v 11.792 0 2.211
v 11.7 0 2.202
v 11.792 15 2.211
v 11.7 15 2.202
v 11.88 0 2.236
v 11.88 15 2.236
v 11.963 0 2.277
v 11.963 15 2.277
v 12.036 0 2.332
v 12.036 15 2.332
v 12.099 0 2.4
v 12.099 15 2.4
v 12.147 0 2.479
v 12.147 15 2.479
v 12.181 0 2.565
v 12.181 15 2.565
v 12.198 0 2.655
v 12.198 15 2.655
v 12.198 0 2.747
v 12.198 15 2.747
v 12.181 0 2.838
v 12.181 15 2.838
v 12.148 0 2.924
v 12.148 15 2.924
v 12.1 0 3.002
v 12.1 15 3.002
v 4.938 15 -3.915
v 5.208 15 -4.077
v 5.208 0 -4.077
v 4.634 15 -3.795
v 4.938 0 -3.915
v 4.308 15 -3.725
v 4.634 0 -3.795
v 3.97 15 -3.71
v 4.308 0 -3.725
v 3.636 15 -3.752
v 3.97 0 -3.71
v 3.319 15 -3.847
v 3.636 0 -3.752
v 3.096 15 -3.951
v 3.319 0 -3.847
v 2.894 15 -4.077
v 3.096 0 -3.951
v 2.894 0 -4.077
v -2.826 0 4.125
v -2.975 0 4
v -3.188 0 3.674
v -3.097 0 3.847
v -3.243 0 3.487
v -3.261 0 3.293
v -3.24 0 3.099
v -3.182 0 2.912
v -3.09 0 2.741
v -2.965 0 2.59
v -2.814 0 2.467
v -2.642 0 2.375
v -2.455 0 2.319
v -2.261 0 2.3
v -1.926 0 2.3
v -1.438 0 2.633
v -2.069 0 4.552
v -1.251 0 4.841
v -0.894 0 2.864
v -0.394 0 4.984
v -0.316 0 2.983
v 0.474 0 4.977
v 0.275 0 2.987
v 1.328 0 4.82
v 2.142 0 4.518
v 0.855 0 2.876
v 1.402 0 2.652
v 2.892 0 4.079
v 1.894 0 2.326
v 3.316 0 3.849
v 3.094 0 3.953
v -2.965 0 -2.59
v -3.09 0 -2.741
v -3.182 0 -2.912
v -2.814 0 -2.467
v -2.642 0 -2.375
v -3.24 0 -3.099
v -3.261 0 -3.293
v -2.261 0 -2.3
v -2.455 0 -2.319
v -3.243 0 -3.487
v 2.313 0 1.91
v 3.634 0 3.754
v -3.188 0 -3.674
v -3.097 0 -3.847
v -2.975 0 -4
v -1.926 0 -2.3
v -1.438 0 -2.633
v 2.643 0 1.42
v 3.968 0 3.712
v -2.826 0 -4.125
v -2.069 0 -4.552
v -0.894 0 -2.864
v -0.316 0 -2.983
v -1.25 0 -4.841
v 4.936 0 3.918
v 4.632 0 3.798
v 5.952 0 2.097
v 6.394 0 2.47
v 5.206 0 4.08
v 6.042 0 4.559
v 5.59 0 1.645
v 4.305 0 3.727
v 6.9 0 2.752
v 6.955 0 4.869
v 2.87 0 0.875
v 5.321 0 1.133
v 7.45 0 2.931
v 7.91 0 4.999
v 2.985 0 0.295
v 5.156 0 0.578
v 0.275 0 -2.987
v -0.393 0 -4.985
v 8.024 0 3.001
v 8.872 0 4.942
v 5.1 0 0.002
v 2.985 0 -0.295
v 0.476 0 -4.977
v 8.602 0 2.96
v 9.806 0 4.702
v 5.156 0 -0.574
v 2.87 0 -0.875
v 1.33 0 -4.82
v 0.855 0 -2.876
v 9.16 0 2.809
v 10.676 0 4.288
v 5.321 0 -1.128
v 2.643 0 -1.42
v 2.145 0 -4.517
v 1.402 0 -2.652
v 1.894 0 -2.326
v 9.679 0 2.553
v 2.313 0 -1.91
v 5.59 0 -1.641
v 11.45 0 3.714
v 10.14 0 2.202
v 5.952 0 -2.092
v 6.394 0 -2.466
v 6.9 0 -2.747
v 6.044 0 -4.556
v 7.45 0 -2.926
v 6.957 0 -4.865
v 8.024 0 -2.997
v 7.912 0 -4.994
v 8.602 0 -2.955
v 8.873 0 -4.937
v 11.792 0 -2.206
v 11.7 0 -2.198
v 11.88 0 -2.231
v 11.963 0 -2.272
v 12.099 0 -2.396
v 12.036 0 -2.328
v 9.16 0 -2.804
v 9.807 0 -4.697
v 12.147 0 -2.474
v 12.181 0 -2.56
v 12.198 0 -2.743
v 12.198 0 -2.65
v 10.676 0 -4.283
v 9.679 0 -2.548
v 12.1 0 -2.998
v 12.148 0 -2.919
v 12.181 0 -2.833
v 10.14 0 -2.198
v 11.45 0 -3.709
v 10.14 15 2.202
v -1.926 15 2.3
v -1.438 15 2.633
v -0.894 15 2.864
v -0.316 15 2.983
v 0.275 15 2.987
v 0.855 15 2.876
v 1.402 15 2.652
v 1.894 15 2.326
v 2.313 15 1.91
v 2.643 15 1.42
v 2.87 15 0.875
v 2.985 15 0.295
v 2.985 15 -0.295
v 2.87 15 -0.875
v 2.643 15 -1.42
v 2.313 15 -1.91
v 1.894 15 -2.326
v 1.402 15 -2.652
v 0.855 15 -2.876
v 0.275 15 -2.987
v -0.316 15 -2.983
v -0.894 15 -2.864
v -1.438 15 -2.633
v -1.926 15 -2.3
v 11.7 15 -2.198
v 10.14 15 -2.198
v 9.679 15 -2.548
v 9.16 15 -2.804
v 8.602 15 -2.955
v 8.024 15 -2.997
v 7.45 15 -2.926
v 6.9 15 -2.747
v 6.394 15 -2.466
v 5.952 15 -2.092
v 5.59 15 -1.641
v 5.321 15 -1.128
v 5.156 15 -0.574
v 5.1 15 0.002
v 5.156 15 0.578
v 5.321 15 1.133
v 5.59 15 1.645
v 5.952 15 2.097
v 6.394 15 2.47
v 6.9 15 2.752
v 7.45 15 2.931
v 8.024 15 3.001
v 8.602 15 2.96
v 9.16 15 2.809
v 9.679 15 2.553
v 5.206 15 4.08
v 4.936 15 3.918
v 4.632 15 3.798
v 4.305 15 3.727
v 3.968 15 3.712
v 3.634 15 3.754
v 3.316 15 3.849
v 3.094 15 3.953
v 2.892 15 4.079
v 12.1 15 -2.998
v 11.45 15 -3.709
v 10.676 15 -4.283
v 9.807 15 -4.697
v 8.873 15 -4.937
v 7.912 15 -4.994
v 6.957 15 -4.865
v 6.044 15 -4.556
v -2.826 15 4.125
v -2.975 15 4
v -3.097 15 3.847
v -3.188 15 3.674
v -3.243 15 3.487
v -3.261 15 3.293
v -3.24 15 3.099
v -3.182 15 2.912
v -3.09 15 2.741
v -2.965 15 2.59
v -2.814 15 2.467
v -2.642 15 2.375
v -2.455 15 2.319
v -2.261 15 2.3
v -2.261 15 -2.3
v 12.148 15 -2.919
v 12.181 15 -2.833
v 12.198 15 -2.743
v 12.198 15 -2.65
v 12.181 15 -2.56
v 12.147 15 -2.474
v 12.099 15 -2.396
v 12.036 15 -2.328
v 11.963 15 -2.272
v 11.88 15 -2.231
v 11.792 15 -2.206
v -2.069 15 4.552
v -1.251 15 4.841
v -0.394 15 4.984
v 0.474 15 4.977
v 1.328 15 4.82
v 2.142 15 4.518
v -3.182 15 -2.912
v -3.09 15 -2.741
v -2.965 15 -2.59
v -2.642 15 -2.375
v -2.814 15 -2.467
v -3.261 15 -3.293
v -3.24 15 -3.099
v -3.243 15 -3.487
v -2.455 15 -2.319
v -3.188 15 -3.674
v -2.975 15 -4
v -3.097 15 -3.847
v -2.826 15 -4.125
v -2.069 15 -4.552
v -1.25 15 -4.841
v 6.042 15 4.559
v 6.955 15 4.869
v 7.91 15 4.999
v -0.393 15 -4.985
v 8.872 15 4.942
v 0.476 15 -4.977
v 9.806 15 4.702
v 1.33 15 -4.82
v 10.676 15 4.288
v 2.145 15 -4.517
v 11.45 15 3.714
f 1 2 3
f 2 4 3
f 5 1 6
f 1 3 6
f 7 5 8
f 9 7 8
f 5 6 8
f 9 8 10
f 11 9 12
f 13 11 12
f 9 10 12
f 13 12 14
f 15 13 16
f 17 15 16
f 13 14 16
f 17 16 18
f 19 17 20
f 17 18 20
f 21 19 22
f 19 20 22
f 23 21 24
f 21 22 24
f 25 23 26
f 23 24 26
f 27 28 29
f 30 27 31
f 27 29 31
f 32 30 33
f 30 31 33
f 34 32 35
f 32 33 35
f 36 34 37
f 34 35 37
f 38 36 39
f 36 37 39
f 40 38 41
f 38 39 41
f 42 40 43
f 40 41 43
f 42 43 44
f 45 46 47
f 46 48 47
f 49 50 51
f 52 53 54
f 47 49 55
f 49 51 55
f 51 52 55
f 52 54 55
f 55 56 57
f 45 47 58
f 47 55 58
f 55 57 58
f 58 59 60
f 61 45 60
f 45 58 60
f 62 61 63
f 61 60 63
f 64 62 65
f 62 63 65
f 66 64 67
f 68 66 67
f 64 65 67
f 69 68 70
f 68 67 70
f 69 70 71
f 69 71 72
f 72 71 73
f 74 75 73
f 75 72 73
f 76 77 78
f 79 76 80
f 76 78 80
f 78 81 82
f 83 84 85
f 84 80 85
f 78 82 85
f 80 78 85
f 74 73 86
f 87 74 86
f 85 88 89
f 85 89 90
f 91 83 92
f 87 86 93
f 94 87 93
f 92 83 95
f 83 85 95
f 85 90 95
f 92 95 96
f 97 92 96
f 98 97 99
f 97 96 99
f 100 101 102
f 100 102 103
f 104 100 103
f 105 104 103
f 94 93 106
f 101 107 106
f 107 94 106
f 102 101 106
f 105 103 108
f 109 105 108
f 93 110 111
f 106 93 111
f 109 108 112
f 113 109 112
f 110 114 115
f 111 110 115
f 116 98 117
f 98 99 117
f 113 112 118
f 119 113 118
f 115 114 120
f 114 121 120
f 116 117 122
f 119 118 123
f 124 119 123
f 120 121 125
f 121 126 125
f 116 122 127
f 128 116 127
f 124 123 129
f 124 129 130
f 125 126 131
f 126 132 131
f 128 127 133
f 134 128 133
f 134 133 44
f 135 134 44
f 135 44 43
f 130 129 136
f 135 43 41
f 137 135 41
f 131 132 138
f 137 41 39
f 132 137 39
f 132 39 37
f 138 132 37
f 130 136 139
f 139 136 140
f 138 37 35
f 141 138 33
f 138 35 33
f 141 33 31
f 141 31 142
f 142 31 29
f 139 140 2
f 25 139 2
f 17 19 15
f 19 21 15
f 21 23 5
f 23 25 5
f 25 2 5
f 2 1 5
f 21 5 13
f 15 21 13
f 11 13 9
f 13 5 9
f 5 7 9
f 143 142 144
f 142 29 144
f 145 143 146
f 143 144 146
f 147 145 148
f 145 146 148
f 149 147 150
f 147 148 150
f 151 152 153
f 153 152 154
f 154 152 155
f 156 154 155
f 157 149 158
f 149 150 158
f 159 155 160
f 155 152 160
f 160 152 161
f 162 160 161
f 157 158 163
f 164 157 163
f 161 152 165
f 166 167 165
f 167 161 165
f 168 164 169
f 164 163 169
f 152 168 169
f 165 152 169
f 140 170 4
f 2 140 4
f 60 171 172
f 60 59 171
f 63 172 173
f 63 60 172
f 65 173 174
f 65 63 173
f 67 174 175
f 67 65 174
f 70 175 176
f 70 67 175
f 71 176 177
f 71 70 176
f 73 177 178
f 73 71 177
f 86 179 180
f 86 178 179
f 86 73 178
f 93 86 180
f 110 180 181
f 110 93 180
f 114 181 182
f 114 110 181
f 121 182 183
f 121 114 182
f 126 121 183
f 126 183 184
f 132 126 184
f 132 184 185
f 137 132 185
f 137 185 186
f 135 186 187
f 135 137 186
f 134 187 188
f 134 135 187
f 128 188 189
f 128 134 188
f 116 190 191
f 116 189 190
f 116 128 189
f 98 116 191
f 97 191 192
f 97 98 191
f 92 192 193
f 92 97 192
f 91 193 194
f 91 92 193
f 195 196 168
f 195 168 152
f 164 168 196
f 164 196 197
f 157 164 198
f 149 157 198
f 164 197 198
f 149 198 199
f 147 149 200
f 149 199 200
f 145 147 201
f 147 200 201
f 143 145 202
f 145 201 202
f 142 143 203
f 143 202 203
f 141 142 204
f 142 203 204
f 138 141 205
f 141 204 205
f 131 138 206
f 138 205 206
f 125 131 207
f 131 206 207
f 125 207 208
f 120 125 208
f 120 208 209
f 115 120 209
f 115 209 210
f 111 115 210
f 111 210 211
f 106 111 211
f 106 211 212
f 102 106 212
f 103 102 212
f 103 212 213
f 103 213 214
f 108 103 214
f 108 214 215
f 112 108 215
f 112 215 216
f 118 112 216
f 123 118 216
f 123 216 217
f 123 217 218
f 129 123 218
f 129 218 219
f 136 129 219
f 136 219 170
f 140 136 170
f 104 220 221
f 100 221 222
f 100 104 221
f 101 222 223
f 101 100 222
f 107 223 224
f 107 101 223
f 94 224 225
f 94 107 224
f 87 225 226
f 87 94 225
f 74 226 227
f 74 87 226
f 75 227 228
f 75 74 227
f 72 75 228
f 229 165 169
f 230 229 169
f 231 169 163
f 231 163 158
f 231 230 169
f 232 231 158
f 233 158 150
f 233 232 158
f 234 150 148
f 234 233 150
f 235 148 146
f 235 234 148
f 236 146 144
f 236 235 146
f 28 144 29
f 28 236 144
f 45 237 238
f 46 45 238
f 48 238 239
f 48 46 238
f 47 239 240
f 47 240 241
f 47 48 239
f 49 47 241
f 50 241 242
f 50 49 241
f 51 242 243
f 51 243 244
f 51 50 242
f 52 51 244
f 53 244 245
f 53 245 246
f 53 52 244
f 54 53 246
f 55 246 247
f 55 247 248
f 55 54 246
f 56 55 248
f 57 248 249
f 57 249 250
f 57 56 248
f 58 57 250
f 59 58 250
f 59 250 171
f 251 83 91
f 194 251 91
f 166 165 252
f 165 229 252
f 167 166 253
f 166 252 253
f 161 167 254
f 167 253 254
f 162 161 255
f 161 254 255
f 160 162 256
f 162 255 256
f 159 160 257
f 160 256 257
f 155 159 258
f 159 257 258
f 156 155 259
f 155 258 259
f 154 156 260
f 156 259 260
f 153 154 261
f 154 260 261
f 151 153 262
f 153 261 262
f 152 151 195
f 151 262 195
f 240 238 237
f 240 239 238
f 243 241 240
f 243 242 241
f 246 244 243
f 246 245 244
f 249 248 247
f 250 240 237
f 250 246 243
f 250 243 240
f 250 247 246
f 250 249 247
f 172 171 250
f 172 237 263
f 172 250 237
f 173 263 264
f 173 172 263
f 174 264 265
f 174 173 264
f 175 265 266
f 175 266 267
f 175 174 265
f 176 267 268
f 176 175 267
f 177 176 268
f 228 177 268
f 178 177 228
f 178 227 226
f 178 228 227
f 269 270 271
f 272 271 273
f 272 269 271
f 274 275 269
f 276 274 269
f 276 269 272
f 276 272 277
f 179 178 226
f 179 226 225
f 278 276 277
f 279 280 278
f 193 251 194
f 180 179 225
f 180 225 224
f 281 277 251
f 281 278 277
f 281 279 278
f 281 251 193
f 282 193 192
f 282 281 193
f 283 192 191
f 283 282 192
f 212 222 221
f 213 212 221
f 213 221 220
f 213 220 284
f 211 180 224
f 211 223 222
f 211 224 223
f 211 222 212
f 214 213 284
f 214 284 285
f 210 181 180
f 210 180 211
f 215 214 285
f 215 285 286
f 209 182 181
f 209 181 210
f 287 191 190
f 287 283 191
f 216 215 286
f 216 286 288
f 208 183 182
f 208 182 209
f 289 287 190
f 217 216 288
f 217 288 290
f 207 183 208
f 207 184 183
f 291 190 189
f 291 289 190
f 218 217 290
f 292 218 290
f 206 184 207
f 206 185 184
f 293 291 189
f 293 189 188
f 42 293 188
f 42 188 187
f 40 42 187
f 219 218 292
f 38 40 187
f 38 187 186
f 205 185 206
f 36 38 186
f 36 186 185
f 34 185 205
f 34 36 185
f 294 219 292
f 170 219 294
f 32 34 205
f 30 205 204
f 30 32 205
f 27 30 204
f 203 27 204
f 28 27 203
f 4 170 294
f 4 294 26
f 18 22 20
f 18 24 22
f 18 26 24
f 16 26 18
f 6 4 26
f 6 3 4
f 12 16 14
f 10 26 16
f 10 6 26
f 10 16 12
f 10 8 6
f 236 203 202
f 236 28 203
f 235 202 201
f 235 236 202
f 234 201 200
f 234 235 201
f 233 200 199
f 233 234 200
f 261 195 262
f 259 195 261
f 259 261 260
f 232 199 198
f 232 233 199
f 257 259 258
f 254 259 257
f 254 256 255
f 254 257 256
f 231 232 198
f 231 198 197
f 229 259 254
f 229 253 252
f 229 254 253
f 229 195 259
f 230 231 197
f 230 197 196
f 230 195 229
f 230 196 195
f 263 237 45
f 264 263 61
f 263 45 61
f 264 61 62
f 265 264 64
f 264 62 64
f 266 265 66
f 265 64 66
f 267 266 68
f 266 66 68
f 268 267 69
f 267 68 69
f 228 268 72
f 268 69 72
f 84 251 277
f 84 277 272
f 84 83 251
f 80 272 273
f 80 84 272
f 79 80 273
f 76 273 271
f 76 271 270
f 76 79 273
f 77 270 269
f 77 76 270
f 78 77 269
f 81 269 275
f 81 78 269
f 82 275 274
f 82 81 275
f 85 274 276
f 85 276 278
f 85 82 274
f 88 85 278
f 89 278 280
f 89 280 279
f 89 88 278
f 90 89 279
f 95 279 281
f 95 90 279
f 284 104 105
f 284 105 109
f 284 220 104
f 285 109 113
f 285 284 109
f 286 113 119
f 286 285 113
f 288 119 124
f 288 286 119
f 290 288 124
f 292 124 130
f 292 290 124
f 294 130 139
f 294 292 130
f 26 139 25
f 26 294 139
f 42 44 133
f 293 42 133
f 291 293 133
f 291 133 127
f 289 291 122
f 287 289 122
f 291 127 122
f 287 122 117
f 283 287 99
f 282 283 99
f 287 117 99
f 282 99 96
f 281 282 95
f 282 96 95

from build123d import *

# Parameters (mm, degrees)
SKETCH1_R           = 5
SKETCH1_R_2         = 3
BOSS_EXTRUDE1_DEPTH = 15
SKETCH2_R           = 5
SKETCH2_R_2         = 3
BOSS_EXTRUDE2_DEPTH = 15
FILLET1_R           = 2
SKETCH3_W           = 7.3092156
SKETCH3_H           = 4.6
CUT_EXTRUDE1_DEPTH  = 15
FILLET2_R           = 1
SKETCH4_W           = 6.886340675
SKETCH4_H           = 4.4
CUT_EXTRUDE2_DEPTH  = 15
FILLET3_R           = 0.5


with BuildPart() as part:
    # Sketch1 → Boss-Extrude1 (new body)
    with BuildSketch(Plane(origin=(0, 0, 0), x_dir=(1, 0, 0), z_dir=(0, 1, 0))):
        Circle(SKETCH1_R)
        Circle(SKETCH1_R_2, mode=Mode.SUBTRACT)
    extrude(amount=BOSS_EXTRUDE1_DEPTH)

    # Sketch2 → Boss-Extrude2 (add)
    with BuildSketch(Plane(origin=(0, 15, 0), x_dir=(1, 0, 0), z_dir=(0, 1, 0))):
        with Locations((8.100044145, -0.002335254)):
            Circle(SKETCH2_R)
        with Locations((8.100044145, -0.002335254)):
            Circle(SKETCH2_R_2, mode=Mode.SUBTRACT)
    extrude(amount=-BOSS_EXTRUDE2_DEPTH)

    # Fillet1
    fillet1_edges = [part.edges().sort_by_distance(p)[0] for p in [
        (4.050867406, 7.5, -2.930950913),
        (4.049176739, 7.5, 2.933286167),
    ]]
    fillet(fillet1_edges, radius=FILLET1_R)

    # Sketch3 → Cut-Extrude1 (cut)
    with BuildSketch(Plane.XZ):
        with Locations((-3.6546078, 0)):
            Rectangle(SKETCH3_W, SKETCH3_H)
    extrude(amount=-CUT_EXTRUDE1_DEPTH, mode=Mode.SUBTRACT)

    # Fillet2
    fillet2_edges = [part.edges().sort_by_distance(p)[0] for p in [
        (-4.439594576, 7.5, 2.3),
        (-4.439594576, 7.5, -2.3),
    ]]
    fillet(fillet2_edges, radius=FILLET2_R)

    # Sketch4 → Cut-Extrude2 (cut)
    with BuildSketch(Plane(origin=(0, 15, 0), x_dir=(1, 0, 0), z_dir=(0, 1, 0))):
        with Locations((11.966816287, -0.002335254)):
            Rectangle(SKETCH4_W, SKETCH4_H)
    extrude(amount=-CUT_EXTRUDE2_DEPTH, mode=Mode.SUBTRACT)

    # Fillet3
    fillet3_edges = [part.edges().sort_by_distance(p)[0] for p in [
        (12.590033009, 7.5, -2.197664746),
        (12.590033009, 7.5, 2.202335254),
    ]]
    fillet(fillet3_edges, radius=FILLET3_R)


solid = part.part
